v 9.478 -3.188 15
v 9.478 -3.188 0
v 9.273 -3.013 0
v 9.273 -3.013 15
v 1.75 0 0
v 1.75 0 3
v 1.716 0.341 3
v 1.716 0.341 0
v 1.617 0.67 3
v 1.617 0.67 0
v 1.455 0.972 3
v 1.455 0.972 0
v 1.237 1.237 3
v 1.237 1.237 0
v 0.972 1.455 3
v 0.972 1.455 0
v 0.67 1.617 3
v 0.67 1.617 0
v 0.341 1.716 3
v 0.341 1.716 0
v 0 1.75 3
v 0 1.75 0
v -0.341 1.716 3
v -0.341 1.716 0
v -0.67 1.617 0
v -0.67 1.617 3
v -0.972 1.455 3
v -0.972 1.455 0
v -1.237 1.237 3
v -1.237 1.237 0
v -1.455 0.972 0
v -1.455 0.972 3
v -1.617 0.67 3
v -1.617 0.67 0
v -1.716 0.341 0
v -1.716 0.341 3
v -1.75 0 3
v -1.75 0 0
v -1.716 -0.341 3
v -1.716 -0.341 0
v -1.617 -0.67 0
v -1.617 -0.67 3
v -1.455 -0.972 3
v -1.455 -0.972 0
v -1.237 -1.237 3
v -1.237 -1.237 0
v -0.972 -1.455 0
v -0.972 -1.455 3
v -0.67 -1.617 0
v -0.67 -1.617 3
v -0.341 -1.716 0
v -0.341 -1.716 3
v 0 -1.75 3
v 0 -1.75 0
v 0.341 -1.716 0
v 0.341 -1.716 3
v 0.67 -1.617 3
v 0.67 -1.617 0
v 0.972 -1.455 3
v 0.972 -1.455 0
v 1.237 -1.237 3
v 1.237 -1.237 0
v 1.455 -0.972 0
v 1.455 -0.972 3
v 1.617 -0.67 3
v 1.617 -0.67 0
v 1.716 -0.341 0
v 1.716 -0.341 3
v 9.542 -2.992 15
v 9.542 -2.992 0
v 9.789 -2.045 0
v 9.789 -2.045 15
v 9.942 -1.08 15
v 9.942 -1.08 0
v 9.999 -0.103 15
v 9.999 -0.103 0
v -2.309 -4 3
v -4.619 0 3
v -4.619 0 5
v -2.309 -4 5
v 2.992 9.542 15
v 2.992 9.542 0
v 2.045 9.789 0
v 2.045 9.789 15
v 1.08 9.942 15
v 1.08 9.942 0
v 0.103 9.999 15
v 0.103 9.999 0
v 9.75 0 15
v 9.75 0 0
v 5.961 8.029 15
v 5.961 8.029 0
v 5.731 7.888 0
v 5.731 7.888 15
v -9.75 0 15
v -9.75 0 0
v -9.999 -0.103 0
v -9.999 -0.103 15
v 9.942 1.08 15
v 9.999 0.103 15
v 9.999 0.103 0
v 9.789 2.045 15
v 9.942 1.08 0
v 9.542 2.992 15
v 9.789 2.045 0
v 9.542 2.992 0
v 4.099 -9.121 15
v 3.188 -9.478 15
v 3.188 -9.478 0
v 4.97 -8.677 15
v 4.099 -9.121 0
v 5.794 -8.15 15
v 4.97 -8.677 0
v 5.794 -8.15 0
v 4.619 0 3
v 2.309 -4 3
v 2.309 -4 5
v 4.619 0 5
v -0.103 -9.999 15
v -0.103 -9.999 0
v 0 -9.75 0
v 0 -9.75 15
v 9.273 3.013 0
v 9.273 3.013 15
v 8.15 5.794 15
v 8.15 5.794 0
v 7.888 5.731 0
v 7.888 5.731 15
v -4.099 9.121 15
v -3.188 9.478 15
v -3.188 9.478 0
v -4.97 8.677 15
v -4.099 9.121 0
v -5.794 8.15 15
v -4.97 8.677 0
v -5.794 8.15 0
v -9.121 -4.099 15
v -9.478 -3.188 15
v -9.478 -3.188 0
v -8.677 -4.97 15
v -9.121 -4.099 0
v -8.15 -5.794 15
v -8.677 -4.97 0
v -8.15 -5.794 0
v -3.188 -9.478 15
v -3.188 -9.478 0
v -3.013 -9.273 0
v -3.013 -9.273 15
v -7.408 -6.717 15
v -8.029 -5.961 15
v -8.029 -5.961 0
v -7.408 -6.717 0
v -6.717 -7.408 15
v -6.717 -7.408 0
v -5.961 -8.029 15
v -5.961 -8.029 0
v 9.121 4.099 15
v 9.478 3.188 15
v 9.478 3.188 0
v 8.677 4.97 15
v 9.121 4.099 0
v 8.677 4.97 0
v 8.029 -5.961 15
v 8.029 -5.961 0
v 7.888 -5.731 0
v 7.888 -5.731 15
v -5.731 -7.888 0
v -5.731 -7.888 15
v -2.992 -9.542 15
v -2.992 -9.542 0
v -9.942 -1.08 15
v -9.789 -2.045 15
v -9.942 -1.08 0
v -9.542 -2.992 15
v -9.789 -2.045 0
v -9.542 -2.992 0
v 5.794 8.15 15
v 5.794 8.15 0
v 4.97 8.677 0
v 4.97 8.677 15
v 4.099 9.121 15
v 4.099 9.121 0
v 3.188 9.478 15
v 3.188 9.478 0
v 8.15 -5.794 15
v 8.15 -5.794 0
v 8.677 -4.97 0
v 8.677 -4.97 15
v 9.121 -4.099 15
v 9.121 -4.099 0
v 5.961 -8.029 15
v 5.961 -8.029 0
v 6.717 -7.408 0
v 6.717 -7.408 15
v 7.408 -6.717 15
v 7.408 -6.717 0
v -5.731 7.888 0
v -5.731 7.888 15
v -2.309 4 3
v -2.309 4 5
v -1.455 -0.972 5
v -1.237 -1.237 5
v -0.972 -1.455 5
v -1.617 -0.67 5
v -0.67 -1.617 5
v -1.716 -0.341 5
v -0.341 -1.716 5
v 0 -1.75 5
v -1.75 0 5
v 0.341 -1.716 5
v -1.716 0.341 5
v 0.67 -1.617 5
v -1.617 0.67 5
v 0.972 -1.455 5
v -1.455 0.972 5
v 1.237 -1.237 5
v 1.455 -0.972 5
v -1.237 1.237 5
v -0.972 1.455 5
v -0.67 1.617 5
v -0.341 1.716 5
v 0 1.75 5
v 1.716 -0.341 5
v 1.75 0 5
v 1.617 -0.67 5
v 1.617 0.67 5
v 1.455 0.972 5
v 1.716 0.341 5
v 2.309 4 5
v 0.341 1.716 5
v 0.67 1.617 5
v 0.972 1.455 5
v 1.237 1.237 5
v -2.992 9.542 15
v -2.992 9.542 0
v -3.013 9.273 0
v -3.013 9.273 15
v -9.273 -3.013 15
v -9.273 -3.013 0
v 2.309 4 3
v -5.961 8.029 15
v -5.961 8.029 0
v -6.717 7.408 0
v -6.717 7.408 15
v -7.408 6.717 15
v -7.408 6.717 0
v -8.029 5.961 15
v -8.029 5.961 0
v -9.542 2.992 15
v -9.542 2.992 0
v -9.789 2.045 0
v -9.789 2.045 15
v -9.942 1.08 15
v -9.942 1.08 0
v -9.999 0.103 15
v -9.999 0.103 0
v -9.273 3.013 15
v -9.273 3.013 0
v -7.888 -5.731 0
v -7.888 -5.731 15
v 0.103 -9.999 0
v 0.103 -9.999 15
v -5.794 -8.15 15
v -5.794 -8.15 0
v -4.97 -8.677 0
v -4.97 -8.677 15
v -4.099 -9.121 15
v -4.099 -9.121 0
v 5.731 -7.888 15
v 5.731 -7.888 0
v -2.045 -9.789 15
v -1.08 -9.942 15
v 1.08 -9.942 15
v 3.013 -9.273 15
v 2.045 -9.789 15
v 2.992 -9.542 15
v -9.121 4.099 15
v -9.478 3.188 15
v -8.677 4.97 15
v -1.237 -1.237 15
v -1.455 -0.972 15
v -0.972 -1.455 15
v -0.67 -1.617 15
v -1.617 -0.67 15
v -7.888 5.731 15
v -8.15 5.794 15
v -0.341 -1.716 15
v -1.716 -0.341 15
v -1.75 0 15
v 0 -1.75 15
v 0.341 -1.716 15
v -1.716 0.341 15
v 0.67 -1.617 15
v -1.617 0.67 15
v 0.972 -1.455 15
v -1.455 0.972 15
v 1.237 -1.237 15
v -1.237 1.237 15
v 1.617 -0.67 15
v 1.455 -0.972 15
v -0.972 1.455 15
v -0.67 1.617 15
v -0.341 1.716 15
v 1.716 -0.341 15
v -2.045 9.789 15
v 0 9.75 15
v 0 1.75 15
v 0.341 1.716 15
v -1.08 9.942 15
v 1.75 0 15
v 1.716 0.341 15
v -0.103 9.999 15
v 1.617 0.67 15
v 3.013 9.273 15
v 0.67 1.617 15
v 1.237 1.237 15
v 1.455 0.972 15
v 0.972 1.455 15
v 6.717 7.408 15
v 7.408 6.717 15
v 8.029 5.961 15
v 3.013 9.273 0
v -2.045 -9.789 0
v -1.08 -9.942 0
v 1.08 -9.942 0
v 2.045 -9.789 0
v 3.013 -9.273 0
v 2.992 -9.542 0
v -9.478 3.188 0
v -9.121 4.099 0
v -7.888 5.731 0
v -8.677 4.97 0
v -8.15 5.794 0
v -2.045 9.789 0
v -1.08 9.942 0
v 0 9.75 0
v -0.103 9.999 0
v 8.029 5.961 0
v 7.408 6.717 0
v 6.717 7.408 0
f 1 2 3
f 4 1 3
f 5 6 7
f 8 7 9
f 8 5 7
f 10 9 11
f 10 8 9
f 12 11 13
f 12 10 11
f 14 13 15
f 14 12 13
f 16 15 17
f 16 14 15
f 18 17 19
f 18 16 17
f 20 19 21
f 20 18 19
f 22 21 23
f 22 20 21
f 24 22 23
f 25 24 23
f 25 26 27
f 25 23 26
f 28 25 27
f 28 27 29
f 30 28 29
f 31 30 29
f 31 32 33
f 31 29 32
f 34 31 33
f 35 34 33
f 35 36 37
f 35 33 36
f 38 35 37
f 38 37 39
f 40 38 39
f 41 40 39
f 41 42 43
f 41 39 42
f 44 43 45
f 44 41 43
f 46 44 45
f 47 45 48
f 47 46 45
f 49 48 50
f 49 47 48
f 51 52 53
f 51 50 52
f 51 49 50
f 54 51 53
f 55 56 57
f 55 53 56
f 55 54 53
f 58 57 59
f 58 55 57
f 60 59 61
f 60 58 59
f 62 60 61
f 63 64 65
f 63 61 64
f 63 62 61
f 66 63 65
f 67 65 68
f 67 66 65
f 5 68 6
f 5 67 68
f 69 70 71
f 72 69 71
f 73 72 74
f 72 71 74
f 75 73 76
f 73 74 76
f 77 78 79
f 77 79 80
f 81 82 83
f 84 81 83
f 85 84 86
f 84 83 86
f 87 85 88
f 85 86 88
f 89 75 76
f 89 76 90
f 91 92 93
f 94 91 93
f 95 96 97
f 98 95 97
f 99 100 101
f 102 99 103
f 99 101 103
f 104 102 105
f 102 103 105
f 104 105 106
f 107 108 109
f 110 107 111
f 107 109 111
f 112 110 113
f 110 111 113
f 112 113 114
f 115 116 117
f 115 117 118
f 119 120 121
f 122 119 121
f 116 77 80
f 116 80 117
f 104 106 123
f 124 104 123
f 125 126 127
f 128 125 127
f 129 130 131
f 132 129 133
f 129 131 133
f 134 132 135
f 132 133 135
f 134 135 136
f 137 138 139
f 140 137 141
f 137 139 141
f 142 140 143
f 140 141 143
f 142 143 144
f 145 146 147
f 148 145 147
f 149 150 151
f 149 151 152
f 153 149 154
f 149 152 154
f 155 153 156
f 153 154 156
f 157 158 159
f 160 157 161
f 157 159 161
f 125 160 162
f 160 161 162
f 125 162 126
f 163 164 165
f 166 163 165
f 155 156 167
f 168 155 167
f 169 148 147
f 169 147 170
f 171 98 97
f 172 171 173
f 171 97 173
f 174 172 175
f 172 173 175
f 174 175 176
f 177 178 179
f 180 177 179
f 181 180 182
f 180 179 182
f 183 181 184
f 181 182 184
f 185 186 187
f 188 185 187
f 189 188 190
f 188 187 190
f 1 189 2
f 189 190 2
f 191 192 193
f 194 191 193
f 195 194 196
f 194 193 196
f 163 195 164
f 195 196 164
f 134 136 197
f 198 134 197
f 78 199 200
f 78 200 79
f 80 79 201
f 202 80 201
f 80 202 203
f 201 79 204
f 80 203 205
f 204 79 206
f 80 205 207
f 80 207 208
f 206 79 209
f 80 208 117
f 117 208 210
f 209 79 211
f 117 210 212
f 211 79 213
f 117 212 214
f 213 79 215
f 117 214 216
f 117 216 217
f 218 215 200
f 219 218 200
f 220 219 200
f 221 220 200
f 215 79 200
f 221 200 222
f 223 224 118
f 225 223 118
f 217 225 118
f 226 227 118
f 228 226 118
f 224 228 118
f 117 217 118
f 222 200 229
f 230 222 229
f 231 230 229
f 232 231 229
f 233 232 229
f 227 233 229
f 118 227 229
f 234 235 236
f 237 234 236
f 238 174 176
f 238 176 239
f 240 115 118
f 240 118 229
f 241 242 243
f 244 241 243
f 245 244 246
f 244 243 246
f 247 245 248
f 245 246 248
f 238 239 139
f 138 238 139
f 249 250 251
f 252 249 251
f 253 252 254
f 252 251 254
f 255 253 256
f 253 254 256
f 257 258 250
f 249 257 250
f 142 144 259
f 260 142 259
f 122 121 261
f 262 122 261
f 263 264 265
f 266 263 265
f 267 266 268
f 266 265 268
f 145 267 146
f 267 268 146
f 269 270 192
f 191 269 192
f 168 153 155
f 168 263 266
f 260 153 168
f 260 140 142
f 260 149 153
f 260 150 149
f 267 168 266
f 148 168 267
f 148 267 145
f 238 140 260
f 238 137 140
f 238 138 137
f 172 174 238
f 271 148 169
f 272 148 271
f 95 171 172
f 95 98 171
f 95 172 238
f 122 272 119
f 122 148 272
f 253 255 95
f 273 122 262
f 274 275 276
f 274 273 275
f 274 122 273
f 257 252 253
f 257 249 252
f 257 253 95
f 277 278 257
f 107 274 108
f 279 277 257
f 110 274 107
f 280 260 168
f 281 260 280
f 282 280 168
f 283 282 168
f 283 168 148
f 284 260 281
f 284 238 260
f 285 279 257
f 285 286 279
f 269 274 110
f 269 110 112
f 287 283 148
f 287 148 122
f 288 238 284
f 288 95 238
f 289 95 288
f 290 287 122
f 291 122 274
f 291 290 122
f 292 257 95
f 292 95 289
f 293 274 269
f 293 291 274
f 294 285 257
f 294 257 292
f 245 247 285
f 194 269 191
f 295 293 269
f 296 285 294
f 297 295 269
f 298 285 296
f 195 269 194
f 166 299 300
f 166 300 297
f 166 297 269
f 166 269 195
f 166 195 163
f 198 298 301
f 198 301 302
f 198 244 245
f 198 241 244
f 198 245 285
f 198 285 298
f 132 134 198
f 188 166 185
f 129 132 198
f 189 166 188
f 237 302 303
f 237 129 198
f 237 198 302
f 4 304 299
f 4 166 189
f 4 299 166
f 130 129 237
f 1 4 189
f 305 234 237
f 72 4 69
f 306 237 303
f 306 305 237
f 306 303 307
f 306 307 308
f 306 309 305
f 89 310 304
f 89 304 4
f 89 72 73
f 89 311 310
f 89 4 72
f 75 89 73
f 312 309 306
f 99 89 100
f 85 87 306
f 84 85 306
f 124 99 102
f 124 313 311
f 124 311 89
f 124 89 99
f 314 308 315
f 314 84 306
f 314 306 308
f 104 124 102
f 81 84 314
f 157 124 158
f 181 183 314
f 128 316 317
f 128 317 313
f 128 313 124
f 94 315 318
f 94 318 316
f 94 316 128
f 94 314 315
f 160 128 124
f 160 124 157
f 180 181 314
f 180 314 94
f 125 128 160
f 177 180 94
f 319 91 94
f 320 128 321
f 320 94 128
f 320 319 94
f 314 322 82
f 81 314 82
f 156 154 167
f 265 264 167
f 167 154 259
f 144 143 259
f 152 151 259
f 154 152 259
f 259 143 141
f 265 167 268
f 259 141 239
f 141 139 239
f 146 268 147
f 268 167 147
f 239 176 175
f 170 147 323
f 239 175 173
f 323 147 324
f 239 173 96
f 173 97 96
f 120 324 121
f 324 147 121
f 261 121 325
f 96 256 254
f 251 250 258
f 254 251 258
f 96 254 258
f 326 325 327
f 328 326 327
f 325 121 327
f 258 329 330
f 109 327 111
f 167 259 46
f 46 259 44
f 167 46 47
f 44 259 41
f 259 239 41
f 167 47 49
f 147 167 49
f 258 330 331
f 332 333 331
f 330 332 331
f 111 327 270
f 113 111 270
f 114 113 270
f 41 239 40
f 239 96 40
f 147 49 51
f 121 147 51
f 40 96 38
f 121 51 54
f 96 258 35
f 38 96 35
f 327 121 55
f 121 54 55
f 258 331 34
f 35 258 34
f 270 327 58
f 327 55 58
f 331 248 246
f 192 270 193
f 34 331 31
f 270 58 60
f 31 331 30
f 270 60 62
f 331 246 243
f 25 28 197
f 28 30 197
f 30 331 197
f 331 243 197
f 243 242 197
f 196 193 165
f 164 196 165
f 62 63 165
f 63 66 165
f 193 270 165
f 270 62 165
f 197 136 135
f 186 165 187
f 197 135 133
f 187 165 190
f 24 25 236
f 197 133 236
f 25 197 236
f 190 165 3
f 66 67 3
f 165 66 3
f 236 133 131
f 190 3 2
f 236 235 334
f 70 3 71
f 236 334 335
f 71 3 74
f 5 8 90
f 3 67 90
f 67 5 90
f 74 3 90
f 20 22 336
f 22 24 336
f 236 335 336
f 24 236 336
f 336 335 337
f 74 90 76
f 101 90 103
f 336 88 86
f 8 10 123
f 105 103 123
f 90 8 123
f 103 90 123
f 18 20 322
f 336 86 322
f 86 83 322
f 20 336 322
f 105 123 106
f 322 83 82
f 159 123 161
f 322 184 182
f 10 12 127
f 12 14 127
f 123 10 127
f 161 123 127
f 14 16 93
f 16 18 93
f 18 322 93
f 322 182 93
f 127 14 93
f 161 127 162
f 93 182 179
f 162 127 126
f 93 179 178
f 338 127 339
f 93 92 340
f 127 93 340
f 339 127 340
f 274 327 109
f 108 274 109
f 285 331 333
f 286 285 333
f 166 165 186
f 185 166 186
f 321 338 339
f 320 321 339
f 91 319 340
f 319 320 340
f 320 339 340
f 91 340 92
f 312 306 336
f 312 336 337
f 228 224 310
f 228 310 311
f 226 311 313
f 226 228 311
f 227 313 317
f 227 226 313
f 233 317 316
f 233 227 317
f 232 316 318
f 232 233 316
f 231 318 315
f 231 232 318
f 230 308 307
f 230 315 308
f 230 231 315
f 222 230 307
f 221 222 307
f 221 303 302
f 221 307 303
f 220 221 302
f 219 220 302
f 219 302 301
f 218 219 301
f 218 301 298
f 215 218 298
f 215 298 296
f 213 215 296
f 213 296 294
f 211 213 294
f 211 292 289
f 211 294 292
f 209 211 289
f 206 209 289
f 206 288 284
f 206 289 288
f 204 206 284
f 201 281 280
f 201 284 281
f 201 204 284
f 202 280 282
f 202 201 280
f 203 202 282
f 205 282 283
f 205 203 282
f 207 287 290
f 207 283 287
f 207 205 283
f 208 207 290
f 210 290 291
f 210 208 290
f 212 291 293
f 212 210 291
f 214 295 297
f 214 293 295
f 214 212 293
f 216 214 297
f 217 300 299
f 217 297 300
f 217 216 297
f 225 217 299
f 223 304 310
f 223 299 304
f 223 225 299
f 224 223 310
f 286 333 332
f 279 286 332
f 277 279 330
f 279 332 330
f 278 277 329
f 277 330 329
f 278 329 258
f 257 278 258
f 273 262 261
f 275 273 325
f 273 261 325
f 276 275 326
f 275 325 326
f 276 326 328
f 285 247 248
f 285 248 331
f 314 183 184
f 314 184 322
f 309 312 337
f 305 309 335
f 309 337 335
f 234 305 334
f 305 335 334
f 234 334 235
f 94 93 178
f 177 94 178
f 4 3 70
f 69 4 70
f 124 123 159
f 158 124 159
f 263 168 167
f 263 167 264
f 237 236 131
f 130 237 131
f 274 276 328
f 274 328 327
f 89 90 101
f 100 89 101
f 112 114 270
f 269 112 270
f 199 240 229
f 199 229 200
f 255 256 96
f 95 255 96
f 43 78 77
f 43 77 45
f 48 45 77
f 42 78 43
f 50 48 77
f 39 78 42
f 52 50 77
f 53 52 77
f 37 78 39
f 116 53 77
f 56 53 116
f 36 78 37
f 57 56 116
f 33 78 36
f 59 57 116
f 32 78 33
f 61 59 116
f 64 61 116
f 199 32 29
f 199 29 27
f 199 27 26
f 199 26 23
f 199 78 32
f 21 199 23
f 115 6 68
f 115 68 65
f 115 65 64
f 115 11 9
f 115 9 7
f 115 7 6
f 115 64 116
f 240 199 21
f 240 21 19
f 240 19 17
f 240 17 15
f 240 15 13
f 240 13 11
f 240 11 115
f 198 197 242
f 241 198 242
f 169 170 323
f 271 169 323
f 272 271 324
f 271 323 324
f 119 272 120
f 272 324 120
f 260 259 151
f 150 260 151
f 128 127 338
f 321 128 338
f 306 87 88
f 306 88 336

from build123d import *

# Parameters (mm, degrees)
SKETCH_R           = 10
PAD_DEPTH          = 15
POCKET_DEPTH       = 2
SKETCH002_R        = 1.75
POCKET001_DEPTH    = 15.001
POCKET002_DEPTH    = 79.032242
POLARPATTERN_COUNT = 20


with BuildPart() as part:
    # Sketch → Pad (new body)
    with BuildSketch(Plane.XY):
        Circle(SKETCH_R)
    extrude(amount=PAD_DEPTH)

    # Sketch001 → Pocket (cut)
    with BuildSketch(Plane.XY.offset(3)):
        Polygon((4.618802, 0), (2.309401, 4), (-2.309401, 4), (-4.618802, 0), (-2.309401, -4), (2.309401, -4), align=None)
    extrude(amount=POCKET_DEPTH, mode=Mode.SUBTRACT)

    # Sketch002 → Pocket001 (cut, through all)
    with BuildSketch(Plane.XY):
        Circle(SKETCH002_R)
    extrude(amount=POCKET001_DEPTH, mode=Mode.SUBTRACT)

    # Sketch003 → Pocket002 (cut, through all)
    with BuildSketch(Plane.XY):
        Polygon((-0.206247, 10.247925), (0.206247, 10.247925), (0, 9.75), align=None)
    pocket002 = extrude(amount=POCKET002_DEPTH, mode=Mode.SUBTRACT)

    # PolarPattern: Pocket002 ×20 about axis
    polarpattern_axis = Axis((0, 0, 0), (0, 0, 1))
    for i in range(1, POLARPATTERN_COUNT):
        add(pocket002.rotate(polarpattern_axis, i * 360 / POLARPATTERN_COUNT), mode=Mode.SUBTRACT)


solid = part.part
